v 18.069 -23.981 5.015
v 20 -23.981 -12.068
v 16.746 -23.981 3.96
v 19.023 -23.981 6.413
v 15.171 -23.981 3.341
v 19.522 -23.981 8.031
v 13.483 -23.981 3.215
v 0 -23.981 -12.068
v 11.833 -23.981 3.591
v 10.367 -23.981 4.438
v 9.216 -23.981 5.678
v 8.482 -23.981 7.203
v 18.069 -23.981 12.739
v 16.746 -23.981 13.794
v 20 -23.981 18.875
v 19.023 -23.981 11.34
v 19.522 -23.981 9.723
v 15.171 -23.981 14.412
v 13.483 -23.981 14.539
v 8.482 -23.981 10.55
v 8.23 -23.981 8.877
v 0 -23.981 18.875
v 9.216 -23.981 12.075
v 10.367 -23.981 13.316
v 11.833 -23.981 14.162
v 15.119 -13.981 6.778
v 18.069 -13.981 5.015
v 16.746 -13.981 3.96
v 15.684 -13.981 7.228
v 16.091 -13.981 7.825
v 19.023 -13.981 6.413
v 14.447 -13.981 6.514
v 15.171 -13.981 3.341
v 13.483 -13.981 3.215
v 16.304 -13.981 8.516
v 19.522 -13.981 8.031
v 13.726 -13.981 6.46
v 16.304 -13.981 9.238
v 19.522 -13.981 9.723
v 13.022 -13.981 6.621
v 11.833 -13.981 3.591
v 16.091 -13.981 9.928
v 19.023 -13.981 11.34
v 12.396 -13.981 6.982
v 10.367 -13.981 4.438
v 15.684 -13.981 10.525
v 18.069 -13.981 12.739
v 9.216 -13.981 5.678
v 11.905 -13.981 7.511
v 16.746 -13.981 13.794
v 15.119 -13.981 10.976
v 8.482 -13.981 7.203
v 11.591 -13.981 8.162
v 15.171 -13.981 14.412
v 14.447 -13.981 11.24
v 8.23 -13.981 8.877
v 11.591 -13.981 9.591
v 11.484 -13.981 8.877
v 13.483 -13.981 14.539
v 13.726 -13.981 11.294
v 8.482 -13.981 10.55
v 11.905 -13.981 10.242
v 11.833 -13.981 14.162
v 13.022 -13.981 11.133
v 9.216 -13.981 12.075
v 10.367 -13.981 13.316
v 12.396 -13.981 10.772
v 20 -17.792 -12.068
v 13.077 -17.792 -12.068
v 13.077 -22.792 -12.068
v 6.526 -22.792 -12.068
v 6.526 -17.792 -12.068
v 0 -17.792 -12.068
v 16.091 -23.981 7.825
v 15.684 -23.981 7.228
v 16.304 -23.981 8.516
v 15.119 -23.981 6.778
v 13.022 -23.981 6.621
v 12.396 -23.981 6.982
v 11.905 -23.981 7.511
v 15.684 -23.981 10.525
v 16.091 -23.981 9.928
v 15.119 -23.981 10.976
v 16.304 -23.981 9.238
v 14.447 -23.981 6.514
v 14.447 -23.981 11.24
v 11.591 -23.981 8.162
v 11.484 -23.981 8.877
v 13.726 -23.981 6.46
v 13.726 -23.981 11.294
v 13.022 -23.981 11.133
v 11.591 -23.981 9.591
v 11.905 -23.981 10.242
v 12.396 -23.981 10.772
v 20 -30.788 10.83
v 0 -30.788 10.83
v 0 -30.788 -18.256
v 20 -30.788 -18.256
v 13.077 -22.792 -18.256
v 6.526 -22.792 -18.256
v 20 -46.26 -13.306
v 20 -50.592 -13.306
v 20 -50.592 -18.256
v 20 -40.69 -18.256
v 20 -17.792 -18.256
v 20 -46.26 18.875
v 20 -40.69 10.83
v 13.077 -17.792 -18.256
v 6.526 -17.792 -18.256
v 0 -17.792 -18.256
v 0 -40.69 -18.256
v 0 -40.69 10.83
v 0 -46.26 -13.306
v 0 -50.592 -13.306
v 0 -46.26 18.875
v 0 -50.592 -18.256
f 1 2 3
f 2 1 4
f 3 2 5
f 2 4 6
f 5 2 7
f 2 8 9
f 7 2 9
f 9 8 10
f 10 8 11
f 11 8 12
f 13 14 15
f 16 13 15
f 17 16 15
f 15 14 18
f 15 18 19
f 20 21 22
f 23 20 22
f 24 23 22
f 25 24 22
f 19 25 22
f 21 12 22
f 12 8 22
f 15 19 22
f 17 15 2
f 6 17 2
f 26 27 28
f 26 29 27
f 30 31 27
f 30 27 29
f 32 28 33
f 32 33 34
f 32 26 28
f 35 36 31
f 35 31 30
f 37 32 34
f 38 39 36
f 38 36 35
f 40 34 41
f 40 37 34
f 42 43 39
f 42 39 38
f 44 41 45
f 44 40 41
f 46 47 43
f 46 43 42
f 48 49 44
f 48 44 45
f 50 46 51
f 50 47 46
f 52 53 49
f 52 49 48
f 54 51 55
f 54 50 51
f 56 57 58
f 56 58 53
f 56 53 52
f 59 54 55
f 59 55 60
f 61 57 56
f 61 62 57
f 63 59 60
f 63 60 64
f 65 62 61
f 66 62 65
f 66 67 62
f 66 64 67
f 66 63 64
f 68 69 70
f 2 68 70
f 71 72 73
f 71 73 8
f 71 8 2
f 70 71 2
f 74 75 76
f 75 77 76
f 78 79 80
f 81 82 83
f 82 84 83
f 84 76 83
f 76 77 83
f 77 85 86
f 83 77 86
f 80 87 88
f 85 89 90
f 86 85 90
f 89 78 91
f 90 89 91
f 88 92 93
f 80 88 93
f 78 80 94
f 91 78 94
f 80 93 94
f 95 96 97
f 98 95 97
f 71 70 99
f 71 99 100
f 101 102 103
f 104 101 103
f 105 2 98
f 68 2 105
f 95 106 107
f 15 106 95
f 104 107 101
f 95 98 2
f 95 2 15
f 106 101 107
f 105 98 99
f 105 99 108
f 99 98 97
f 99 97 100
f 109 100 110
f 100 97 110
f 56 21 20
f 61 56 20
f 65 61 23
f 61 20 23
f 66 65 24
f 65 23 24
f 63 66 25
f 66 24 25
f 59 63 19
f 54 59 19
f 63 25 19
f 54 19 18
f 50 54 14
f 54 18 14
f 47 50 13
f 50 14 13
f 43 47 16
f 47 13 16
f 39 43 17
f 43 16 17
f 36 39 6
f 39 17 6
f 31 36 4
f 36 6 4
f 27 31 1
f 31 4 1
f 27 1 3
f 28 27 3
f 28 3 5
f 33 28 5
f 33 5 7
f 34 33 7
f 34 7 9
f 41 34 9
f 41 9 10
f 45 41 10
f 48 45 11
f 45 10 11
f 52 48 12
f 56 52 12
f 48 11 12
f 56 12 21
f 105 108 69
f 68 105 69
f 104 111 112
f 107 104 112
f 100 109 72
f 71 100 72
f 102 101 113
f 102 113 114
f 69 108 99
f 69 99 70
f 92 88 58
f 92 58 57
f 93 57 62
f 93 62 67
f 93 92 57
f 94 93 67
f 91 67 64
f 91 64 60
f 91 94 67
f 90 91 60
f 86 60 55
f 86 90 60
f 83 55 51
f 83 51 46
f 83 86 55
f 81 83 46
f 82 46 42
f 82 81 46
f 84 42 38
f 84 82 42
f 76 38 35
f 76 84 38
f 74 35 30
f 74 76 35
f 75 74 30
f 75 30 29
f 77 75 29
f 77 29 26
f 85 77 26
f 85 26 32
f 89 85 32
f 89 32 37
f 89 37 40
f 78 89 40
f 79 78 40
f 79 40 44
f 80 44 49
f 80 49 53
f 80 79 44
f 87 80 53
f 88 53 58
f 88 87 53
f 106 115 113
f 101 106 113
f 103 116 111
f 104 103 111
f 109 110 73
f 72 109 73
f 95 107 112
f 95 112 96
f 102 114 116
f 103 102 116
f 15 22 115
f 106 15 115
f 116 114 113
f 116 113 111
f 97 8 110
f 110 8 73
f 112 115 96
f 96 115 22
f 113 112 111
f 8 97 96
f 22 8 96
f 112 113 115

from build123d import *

# Parameters (mm, degrees)
F1_DEPTH = 20
F2_W     = 6.5510021523
F2_H     = 6.1886049807
F3_DEPTH = 5
F4_R     = 5.6777996294
F4_R_2   = 2.4237453519
F5_DEPTH = 10


with BuildPart() as f1:
    # F0 (on Right) → F1 (new body)
    with BuildSketch(Plane.YZ):
        Polygon((-46.2598241866, -13.305501081), (-50.5918487906, -13.305501081), (-50.5918487906, -18.2563848794), (-40.6900793314, -18.2563848794), (-40.6900793314, 10.8300596476), (-30.7883117348, 10.8300596476), (-30.7883117348, -18.2563848794), (-17.7922397852, -18.2563848794), (-17.7922397852, -12.0677798986), (-23.9808466285, -12.0677798986), (-23.9808466285, 18.8752468675), (-46.2598241866, 18.8752468675), align=None)
    extrude(amount=F1_DEPTH)

    # F2 (on face) → F3 (cut)
    with BuildSketch(Plane(origin=(0, -17.7922397852, 0), x_dir=(-1, 0, 0), z_dir=(0, 1, 0))):
        with Locations((-9.8014348187, -15.162082389)):
            Rectangle(F2_W, F2_H)
    extrude(amount=-F3_DEPTH, mode=Mode.SUBTRACT)

    # F4 (on face) → F5 (join)
    with BuildSketch(Plane(origin=(0, -23.9808466285, 0), x_dir=(-1, 0, 0), z_dir=(0, 1, 0))):
        with Locations((-13.9073636383, 8.8768014684)):
            Circle(F4_R)
        with Locations((-13.9073636383, 8.8768014684)):
            Circle(F4_R_2, mode=Mode.SUBTRACT)
    extrude(amount=F5_DEPTH)


solid = f1.part
